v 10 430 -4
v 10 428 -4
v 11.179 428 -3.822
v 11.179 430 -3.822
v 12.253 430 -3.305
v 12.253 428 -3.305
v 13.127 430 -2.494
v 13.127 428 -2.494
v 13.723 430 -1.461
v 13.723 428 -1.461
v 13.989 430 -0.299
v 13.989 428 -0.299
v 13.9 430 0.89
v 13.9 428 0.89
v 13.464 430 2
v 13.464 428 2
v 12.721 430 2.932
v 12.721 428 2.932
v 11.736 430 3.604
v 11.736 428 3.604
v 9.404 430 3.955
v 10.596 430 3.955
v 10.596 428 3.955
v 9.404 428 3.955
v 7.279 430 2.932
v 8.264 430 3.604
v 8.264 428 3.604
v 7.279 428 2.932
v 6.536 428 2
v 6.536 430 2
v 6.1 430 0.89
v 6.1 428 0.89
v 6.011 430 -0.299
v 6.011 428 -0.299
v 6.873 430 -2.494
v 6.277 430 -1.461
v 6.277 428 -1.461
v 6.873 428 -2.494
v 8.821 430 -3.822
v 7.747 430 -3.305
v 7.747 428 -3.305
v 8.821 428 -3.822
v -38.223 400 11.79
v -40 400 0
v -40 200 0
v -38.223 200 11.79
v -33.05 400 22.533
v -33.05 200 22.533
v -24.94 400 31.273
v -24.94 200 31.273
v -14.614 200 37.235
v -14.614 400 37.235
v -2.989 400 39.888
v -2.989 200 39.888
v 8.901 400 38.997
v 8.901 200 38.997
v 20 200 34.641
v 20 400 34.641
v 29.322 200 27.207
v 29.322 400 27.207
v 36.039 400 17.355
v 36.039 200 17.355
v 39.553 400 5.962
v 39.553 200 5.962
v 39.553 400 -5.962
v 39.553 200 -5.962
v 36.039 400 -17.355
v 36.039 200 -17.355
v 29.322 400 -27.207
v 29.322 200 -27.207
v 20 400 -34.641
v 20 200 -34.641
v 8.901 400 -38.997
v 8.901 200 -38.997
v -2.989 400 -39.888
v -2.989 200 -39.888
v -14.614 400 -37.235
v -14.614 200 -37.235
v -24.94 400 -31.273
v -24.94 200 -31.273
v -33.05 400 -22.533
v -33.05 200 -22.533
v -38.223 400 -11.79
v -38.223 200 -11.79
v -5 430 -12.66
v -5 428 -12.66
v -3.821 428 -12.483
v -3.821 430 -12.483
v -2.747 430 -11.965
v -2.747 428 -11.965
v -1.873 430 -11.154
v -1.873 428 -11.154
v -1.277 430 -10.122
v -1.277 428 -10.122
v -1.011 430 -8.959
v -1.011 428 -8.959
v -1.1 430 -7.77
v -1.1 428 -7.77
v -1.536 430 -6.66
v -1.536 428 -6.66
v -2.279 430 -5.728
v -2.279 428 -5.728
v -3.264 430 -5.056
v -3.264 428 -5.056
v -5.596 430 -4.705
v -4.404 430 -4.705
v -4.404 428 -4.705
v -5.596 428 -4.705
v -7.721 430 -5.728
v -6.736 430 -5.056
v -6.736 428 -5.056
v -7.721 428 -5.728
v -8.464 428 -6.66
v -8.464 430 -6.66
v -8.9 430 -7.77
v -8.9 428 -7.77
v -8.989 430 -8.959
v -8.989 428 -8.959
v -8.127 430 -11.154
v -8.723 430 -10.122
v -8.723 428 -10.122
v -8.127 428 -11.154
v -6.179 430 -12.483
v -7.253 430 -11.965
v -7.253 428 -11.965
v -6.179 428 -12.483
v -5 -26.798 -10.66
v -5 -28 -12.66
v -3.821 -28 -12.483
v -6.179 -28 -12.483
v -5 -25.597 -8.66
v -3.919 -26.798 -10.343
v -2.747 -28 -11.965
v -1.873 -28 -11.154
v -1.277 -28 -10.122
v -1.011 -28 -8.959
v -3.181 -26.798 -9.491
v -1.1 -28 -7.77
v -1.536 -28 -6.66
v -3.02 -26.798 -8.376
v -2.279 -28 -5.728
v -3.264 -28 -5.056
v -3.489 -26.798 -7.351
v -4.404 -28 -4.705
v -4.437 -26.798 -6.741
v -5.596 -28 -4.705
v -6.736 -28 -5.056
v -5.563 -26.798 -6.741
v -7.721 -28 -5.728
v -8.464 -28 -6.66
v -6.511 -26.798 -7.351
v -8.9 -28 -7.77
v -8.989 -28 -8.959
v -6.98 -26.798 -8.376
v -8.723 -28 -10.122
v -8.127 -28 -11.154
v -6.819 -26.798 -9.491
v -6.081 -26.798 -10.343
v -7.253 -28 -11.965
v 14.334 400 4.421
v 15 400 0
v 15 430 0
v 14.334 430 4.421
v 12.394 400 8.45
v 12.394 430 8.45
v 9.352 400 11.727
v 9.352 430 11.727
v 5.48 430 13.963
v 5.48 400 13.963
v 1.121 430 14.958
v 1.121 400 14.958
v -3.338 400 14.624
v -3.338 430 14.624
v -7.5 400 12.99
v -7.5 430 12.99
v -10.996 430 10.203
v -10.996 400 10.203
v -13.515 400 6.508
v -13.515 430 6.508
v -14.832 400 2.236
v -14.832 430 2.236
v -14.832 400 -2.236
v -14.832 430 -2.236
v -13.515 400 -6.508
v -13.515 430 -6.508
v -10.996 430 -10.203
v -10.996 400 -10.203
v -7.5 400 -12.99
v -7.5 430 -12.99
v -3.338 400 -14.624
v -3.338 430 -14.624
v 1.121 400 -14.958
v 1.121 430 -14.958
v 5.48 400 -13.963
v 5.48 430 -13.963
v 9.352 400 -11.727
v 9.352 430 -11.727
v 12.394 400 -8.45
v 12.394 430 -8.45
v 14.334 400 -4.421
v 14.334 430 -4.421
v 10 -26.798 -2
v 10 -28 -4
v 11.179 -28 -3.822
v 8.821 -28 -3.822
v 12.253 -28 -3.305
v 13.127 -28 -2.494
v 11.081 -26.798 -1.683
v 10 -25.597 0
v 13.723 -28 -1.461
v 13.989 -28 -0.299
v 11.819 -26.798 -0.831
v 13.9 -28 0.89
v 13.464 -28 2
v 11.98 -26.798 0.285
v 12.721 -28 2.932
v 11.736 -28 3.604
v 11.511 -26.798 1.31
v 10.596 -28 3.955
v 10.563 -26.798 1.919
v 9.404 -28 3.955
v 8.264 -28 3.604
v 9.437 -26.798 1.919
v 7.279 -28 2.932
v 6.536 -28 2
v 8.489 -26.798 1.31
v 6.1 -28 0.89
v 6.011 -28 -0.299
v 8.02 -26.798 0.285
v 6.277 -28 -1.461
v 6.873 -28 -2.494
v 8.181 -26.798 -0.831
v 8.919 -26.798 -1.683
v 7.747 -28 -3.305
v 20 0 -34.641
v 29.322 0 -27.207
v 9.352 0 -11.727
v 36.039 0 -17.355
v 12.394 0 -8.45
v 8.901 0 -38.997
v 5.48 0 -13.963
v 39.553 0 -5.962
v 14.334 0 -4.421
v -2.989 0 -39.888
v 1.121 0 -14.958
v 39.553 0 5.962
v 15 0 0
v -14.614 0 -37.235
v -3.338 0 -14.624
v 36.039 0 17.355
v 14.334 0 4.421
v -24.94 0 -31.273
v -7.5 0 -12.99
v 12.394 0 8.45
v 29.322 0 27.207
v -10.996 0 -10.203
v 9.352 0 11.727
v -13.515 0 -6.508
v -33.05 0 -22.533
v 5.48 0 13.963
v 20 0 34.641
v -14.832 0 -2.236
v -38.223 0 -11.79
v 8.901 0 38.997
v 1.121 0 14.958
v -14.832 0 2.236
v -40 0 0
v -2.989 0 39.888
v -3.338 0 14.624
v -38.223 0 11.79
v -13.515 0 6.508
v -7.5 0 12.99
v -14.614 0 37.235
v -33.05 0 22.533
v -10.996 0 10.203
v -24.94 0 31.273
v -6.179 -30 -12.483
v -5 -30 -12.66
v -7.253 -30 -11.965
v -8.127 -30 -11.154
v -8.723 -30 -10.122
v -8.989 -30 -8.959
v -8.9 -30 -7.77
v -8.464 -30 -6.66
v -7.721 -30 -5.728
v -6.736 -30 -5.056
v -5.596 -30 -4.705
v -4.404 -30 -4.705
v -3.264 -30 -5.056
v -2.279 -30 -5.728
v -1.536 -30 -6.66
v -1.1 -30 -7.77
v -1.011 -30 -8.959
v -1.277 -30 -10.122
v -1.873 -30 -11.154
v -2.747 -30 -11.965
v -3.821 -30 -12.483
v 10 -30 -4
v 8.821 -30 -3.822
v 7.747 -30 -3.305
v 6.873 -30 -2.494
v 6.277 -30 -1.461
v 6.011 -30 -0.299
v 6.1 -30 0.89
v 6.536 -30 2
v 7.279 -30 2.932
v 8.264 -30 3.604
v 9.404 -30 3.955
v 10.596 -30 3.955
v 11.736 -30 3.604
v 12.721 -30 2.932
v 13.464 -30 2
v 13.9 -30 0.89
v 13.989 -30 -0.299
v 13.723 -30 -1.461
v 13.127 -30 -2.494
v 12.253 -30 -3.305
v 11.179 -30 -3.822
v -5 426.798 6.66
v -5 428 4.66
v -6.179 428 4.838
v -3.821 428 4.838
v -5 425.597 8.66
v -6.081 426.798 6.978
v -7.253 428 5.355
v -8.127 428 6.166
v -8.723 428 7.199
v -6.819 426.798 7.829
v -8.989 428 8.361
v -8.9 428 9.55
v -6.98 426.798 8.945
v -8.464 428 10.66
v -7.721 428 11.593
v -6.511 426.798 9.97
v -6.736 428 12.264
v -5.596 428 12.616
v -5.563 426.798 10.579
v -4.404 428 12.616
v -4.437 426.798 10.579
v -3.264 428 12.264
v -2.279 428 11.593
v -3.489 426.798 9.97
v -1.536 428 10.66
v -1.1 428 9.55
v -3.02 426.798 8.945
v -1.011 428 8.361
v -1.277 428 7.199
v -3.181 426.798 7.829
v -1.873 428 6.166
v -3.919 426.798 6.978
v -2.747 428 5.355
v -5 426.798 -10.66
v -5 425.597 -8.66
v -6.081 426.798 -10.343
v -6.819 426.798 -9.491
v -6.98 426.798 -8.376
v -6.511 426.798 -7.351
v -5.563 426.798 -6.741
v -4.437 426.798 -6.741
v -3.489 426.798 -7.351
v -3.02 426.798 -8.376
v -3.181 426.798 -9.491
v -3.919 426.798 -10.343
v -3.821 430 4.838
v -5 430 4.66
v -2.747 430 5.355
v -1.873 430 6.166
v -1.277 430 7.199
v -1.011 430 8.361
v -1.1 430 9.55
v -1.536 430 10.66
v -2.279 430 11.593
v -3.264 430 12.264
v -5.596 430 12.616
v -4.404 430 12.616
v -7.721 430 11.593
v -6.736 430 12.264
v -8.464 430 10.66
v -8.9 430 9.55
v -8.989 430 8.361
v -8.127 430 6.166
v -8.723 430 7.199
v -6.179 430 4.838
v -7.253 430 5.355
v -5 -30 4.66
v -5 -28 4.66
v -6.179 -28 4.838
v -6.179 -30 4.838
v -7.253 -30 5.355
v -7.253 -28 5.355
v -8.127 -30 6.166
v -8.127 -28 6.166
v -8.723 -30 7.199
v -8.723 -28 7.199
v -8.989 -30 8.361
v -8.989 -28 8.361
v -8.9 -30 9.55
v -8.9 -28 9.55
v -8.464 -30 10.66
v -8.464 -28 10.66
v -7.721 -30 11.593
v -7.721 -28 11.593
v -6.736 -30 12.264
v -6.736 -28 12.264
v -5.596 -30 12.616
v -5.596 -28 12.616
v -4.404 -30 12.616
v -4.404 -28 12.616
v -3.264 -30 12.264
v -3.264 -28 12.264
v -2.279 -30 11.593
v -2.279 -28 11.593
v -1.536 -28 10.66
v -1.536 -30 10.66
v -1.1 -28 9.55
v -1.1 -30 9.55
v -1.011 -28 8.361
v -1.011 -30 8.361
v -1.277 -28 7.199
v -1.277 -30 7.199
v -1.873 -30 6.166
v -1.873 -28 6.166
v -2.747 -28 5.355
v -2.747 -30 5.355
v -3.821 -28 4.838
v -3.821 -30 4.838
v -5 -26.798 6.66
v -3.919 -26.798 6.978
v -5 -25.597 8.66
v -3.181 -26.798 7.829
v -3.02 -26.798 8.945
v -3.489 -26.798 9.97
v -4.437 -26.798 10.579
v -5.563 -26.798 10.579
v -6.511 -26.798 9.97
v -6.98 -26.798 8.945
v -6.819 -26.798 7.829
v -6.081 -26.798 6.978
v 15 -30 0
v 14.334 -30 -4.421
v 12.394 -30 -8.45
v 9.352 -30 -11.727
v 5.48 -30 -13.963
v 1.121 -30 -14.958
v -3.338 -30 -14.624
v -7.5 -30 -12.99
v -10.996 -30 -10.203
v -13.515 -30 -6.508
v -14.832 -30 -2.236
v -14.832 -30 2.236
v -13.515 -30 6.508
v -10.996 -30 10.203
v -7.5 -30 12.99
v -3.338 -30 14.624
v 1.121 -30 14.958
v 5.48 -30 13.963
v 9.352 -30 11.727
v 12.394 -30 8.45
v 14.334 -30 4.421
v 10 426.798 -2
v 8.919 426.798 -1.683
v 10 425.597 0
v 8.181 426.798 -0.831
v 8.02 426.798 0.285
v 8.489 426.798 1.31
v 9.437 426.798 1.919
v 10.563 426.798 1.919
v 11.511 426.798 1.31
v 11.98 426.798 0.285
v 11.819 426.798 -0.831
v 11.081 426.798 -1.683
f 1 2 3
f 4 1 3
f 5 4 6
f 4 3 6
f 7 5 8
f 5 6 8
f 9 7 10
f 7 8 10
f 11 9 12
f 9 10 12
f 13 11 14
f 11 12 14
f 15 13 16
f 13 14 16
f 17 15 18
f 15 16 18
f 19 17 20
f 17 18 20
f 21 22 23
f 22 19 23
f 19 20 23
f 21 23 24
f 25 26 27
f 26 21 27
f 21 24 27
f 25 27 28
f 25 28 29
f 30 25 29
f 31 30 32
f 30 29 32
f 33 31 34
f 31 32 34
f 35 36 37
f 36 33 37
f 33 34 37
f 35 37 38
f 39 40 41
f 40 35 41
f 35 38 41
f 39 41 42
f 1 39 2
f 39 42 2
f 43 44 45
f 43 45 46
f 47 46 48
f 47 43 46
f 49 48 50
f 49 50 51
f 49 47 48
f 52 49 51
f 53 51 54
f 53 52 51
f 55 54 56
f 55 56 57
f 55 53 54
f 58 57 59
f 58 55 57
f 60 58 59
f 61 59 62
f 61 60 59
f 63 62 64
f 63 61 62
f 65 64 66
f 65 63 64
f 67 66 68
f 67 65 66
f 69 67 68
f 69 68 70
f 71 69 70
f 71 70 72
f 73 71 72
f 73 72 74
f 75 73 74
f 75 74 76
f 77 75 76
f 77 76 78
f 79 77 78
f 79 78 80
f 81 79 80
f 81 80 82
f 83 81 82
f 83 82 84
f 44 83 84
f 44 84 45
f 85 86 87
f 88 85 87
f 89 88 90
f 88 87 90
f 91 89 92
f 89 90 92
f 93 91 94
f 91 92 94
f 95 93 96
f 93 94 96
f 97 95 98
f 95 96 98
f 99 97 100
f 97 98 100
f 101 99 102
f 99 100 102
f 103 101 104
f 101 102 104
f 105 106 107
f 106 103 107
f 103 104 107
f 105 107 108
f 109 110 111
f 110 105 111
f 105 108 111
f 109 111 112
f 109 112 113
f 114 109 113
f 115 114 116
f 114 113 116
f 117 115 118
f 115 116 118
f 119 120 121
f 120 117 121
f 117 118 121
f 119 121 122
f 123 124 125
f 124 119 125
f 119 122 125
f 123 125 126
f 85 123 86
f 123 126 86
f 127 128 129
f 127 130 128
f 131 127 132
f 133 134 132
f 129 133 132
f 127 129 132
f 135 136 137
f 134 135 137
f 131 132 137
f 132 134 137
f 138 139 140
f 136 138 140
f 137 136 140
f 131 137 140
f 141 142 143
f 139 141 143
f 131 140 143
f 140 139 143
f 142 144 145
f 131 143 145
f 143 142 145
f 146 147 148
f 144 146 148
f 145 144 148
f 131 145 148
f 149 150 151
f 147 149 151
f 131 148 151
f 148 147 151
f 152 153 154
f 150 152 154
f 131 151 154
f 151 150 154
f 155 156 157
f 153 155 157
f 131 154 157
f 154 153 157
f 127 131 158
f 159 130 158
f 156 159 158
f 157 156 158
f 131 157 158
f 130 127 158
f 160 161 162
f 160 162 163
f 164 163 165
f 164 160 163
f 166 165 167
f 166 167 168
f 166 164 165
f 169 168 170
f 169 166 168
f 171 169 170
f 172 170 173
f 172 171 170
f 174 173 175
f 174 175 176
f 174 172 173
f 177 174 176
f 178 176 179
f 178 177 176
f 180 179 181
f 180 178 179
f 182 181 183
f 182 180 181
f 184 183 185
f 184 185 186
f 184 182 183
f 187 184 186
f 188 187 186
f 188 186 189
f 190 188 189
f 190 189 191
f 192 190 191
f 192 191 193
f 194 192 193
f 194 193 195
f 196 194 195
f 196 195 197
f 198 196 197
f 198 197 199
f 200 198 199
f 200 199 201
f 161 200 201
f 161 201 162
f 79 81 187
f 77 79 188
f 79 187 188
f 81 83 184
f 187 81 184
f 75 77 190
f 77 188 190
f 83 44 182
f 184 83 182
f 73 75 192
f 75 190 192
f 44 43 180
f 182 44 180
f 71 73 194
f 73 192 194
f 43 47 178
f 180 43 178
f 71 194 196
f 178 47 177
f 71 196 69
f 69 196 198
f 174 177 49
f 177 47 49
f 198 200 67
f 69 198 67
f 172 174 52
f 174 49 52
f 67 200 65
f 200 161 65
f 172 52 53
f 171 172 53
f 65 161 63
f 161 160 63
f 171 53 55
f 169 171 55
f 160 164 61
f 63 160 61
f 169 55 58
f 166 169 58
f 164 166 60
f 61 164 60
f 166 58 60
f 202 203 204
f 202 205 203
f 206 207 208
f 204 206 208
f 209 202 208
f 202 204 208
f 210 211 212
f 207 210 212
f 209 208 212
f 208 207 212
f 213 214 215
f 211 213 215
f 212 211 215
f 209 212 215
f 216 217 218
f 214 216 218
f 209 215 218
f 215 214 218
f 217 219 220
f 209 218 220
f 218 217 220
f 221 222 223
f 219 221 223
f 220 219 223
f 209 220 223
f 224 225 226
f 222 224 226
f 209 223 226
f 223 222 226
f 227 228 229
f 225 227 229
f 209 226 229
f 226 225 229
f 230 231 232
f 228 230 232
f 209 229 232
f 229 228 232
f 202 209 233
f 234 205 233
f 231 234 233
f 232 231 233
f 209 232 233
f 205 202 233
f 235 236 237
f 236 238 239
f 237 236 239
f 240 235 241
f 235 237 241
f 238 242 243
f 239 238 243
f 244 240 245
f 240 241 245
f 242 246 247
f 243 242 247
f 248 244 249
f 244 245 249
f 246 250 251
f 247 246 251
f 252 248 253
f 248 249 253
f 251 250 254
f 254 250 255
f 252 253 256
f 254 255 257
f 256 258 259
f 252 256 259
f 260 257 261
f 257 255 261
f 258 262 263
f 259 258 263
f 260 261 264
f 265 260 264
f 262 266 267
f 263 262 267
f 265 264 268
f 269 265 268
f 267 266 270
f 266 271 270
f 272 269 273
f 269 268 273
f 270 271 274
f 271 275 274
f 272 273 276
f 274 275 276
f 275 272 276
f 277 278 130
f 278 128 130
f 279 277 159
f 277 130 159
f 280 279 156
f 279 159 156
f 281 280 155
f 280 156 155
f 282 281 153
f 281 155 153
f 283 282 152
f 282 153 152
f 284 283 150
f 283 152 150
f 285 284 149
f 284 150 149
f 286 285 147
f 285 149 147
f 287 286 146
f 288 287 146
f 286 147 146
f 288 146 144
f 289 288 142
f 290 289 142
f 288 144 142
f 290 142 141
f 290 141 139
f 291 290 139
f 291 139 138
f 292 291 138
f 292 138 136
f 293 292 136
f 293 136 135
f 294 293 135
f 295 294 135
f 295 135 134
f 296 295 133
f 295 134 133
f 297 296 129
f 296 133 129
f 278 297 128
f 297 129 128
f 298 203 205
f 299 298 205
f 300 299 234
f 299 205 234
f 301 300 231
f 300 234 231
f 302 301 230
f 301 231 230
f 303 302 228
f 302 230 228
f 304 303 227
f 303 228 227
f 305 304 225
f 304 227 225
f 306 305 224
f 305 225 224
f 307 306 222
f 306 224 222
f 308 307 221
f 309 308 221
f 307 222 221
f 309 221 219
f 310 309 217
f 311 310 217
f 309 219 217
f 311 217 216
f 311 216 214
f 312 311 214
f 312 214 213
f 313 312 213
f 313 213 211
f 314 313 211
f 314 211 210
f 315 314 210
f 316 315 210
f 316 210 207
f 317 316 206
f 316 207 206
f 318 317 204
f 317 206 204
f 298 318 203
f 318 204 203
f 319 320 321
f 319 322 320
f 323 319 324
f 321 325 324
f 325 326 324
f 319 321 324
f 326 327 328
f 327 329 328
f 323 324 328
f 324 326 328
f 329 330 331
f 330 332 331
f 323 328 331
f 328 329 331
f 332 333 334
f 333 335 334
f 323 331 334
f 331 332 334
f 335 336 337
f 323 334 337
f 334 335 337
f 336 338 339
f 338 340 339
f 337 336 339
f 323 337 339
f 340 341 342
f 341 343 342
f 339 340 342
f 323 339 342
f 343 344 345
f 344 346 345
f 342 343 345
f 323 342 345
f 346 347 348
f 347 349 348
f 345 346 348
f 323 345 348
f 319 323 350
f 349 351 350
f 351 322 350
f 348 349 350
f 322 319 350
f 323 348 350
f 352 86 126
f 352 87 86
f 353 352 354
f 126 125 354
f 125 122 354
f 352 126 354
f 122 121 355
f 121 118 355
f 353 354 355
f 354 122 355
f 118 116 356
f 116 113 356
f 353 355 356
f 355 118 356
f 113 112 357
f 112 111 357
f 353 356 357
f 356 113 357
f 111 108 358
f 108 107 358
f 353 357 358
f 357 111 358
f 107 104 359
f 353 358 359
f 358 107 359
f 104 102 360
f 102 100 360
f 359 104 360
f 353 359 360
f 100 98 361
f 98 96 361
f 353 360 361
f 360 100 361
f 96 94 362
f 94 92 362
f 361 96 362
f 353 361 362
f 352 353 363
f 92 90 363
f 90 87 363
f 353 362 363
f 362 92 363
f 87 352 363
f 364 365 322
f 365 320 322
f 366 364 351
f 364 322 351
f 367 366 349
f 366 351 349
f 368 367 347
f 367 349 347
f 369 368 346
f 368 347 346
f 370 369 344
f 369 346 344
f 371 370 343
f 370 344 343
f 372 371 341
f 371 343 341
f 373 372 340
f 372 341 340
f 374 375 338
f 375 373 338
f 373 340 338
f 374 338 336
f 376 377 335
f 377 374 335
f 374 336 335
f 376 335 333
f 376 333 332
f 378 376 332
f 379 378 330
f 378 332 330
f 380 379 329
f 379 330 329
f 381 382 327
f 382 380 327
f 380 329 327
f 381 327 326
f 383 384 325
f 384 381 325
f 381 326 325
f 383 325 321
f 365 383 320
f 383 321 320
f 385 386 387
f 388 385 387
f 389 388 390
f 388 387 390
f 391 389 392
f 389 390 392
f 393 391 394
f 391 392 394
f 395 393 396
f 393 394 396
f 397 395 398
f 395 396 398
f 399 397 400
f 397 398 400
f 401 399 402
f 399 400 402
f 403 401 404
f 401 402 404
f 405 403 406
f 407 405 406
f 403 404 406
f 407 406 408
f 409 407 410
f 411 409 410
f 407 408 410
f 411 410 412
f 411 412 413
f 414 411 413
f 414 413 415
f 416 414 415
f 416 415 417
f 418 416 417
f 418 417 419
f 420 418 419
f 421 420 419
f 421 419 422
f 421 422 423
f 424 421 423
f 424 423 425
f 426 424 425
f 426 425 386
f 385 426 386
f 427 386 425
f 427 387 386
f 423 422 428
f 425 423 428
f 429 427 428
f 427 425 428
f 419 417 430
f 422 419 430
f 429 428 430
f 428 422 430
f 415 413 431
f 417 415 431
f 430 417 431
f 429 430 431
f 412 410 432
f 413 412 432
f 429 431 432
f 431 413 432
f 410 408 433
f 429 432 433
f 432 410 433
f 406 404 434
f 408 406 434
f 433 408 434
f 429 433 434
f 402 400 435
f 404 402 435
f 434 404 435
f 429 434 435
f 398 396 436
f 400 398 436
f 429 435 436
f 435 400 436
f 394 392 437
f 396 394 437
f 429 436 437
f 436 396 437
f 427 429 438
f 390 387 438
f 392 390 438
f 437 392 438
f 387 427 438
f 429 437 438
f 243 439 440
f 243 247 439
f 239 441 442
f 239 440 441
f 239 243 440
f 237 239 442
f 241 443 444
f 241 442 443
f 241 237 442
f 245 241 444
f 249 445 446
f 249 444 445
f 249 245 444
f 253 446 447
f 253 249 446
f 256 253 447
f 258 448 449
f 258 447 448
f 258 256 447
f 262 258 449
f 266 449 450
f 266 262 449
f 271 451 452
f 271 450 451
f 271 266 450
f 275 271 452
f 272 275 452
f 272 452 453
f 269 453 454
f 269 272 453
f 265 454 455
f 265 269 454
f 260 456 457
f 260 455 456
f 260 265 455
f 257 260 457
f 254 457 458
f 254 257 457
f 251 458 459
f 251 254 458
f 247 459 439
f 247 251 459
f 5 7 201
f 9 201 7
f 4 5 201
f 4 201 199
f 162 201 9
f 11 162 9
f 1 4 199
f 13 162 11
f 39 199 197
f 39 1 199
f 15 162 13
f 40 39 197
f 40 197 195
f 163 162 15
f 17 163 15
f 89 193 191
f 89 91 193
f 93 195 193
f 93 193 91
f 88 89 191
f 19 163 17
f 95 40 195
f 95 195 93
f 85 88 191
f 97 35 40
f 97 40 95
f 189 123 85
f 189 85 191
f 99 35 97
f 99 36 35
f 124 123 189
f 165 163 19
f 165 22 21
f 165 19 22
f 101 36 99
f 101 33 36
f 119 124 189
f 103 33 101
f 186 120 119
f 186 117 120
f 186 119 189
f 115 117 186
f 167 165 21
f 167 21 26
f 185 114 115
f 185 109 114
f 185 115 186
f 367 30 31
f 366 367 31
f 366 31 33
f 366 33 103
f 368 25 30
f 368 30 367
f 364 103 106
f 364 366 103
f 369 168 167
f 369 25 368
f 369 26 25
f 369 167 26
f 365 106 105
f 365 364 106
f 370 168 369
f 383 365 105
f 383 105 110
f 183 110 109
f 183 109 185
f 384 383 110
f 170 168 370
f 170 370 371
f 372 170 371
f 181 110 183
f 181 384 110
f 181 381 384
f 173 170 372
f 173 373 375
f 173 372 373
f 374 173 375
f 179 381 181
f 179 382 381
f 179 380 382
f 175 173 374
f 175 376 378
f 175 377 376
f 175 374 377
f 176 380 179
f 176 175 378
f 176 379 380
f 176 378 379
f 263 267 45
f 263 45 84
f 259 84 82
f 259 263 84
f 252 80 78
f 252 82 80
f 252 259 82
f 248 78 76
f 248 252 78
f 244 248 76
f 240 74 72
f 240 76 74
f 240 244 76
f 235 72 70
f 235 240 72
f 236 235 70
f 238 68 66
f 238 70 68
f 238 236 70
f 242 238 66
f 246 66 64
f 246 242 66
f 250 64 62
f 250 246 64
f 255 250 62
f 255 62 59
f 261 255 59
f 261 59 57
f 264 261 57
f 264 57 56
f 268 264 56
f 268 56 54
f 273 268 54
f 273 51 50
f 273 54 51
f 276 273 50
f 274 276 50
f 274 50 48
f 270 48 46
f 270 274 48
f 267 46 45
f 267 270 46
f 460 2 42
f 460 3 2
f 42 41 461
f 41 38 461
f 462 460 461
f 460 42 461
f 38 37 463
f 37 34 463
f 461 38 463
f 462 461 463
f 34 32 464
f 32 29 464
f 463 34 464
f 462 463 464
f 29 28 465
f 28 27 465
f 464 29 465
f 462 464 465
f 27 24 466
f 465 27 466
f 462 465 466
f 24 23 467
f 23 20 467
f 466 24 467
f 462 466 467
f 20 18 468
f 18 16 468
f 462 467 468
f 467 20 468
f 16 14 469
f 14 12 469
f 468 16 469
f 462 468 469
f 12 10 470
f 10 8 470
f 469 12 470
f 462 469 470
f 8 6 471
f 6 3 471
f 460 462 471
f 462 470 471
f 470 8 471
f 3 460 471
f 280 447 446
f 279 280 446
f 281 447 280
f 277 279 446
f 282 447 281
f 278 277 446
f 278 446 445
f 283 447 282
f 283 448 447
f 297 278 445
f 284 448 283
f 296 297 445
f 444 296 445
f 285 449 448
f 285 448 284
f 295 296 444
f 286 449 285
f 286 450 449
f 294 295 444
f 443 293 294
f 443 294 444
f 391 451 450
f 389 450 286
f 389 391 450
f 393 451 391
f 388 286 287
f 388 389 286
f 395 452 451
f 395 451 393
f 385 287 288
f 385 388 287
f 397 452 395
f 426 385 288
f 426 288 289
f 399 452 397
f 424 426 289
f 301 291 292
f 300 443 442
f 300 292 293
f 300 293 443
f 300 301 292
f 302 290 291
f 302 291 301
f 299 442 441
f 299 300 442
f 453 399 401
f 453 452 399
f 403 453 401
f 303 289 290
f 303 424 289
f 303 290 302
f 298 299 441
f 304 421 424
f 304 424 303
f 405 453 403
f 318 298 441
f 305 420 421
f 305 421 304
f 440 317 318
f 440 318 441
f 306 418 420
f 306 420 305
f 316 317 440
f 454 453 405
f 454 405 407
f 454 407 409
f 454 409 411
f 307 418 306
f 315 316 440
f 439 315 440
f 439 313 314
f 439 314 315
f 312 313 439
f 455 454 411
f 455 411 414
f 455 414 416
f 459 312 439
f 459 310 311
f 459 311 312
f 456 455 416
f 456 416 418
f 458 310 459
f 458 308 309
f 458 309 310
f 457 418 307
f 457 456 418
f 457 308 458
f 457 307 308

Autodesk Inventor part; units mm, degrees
ref_plane "YZ Plane" through (0, 0, 0) normal (1, 0, 0) x (0, 1, 0)
ref_plane "XZ Plane" through (0, 0, 0) normal (0, 1, 0) x (-1, 0, 0)
ref_plane "XY Plane" through (0, 0, 0) normal (0, 0, 1) x (1, 0, 0)
sketch "Skizze1" plane through (0, 0, 0) normal (0, 1, 0) x (-1, 0, 0)
  circle A0 centre (0, 0) radius 40
  dimension "d0" = 80
extrude "Extrusion1" add sketch "Skizze1" along normal blind 200
sketch "Skizze2" plane through (0, 0, 0) normal (0, -1, 0) x (1, 0, 0)
  circle A0 centre (0, 0) radius 15
  dimension "d3" = 30
extrude "Extrusion2" add sketch "Skizze2" along normal blind 30
sketch "Skizze3" plane through (0, -30, 0) normal (0, -1, 0) x (1, 0, 0)
  line L0 (0, 0) -> (-7.5, 12.9904)
  circle A0 centre (0, 0) radius 15 projected
  line L1 (0, 0) -> (-7.5, -12.9904)
  line L2 (0, 0) -> (15, 0)
  circle A1 centre (0, 0) radius 10
  point P0 (-5, -8.6603)
  point P1 (-5, 8.6603)
  point P2 (10, 0)
  dimension "d6" = 120
  dimension "d7" = 120
  dimension "d8" = 20
hole "Bohrung1" at (-5, -30, -8.6603) at (-5, -30, 8.6603) at (10, -30, 0) direction (0, 1, 0) diameter 8 depth 2 tip angle 118
mirror "Spiegeln1" about plane through (0, 200, 0) normal (0, 1, 0) of "Extrusion1", "Extrusion2", "Bohrung1"
properties part number "Foerderbandrollen"
